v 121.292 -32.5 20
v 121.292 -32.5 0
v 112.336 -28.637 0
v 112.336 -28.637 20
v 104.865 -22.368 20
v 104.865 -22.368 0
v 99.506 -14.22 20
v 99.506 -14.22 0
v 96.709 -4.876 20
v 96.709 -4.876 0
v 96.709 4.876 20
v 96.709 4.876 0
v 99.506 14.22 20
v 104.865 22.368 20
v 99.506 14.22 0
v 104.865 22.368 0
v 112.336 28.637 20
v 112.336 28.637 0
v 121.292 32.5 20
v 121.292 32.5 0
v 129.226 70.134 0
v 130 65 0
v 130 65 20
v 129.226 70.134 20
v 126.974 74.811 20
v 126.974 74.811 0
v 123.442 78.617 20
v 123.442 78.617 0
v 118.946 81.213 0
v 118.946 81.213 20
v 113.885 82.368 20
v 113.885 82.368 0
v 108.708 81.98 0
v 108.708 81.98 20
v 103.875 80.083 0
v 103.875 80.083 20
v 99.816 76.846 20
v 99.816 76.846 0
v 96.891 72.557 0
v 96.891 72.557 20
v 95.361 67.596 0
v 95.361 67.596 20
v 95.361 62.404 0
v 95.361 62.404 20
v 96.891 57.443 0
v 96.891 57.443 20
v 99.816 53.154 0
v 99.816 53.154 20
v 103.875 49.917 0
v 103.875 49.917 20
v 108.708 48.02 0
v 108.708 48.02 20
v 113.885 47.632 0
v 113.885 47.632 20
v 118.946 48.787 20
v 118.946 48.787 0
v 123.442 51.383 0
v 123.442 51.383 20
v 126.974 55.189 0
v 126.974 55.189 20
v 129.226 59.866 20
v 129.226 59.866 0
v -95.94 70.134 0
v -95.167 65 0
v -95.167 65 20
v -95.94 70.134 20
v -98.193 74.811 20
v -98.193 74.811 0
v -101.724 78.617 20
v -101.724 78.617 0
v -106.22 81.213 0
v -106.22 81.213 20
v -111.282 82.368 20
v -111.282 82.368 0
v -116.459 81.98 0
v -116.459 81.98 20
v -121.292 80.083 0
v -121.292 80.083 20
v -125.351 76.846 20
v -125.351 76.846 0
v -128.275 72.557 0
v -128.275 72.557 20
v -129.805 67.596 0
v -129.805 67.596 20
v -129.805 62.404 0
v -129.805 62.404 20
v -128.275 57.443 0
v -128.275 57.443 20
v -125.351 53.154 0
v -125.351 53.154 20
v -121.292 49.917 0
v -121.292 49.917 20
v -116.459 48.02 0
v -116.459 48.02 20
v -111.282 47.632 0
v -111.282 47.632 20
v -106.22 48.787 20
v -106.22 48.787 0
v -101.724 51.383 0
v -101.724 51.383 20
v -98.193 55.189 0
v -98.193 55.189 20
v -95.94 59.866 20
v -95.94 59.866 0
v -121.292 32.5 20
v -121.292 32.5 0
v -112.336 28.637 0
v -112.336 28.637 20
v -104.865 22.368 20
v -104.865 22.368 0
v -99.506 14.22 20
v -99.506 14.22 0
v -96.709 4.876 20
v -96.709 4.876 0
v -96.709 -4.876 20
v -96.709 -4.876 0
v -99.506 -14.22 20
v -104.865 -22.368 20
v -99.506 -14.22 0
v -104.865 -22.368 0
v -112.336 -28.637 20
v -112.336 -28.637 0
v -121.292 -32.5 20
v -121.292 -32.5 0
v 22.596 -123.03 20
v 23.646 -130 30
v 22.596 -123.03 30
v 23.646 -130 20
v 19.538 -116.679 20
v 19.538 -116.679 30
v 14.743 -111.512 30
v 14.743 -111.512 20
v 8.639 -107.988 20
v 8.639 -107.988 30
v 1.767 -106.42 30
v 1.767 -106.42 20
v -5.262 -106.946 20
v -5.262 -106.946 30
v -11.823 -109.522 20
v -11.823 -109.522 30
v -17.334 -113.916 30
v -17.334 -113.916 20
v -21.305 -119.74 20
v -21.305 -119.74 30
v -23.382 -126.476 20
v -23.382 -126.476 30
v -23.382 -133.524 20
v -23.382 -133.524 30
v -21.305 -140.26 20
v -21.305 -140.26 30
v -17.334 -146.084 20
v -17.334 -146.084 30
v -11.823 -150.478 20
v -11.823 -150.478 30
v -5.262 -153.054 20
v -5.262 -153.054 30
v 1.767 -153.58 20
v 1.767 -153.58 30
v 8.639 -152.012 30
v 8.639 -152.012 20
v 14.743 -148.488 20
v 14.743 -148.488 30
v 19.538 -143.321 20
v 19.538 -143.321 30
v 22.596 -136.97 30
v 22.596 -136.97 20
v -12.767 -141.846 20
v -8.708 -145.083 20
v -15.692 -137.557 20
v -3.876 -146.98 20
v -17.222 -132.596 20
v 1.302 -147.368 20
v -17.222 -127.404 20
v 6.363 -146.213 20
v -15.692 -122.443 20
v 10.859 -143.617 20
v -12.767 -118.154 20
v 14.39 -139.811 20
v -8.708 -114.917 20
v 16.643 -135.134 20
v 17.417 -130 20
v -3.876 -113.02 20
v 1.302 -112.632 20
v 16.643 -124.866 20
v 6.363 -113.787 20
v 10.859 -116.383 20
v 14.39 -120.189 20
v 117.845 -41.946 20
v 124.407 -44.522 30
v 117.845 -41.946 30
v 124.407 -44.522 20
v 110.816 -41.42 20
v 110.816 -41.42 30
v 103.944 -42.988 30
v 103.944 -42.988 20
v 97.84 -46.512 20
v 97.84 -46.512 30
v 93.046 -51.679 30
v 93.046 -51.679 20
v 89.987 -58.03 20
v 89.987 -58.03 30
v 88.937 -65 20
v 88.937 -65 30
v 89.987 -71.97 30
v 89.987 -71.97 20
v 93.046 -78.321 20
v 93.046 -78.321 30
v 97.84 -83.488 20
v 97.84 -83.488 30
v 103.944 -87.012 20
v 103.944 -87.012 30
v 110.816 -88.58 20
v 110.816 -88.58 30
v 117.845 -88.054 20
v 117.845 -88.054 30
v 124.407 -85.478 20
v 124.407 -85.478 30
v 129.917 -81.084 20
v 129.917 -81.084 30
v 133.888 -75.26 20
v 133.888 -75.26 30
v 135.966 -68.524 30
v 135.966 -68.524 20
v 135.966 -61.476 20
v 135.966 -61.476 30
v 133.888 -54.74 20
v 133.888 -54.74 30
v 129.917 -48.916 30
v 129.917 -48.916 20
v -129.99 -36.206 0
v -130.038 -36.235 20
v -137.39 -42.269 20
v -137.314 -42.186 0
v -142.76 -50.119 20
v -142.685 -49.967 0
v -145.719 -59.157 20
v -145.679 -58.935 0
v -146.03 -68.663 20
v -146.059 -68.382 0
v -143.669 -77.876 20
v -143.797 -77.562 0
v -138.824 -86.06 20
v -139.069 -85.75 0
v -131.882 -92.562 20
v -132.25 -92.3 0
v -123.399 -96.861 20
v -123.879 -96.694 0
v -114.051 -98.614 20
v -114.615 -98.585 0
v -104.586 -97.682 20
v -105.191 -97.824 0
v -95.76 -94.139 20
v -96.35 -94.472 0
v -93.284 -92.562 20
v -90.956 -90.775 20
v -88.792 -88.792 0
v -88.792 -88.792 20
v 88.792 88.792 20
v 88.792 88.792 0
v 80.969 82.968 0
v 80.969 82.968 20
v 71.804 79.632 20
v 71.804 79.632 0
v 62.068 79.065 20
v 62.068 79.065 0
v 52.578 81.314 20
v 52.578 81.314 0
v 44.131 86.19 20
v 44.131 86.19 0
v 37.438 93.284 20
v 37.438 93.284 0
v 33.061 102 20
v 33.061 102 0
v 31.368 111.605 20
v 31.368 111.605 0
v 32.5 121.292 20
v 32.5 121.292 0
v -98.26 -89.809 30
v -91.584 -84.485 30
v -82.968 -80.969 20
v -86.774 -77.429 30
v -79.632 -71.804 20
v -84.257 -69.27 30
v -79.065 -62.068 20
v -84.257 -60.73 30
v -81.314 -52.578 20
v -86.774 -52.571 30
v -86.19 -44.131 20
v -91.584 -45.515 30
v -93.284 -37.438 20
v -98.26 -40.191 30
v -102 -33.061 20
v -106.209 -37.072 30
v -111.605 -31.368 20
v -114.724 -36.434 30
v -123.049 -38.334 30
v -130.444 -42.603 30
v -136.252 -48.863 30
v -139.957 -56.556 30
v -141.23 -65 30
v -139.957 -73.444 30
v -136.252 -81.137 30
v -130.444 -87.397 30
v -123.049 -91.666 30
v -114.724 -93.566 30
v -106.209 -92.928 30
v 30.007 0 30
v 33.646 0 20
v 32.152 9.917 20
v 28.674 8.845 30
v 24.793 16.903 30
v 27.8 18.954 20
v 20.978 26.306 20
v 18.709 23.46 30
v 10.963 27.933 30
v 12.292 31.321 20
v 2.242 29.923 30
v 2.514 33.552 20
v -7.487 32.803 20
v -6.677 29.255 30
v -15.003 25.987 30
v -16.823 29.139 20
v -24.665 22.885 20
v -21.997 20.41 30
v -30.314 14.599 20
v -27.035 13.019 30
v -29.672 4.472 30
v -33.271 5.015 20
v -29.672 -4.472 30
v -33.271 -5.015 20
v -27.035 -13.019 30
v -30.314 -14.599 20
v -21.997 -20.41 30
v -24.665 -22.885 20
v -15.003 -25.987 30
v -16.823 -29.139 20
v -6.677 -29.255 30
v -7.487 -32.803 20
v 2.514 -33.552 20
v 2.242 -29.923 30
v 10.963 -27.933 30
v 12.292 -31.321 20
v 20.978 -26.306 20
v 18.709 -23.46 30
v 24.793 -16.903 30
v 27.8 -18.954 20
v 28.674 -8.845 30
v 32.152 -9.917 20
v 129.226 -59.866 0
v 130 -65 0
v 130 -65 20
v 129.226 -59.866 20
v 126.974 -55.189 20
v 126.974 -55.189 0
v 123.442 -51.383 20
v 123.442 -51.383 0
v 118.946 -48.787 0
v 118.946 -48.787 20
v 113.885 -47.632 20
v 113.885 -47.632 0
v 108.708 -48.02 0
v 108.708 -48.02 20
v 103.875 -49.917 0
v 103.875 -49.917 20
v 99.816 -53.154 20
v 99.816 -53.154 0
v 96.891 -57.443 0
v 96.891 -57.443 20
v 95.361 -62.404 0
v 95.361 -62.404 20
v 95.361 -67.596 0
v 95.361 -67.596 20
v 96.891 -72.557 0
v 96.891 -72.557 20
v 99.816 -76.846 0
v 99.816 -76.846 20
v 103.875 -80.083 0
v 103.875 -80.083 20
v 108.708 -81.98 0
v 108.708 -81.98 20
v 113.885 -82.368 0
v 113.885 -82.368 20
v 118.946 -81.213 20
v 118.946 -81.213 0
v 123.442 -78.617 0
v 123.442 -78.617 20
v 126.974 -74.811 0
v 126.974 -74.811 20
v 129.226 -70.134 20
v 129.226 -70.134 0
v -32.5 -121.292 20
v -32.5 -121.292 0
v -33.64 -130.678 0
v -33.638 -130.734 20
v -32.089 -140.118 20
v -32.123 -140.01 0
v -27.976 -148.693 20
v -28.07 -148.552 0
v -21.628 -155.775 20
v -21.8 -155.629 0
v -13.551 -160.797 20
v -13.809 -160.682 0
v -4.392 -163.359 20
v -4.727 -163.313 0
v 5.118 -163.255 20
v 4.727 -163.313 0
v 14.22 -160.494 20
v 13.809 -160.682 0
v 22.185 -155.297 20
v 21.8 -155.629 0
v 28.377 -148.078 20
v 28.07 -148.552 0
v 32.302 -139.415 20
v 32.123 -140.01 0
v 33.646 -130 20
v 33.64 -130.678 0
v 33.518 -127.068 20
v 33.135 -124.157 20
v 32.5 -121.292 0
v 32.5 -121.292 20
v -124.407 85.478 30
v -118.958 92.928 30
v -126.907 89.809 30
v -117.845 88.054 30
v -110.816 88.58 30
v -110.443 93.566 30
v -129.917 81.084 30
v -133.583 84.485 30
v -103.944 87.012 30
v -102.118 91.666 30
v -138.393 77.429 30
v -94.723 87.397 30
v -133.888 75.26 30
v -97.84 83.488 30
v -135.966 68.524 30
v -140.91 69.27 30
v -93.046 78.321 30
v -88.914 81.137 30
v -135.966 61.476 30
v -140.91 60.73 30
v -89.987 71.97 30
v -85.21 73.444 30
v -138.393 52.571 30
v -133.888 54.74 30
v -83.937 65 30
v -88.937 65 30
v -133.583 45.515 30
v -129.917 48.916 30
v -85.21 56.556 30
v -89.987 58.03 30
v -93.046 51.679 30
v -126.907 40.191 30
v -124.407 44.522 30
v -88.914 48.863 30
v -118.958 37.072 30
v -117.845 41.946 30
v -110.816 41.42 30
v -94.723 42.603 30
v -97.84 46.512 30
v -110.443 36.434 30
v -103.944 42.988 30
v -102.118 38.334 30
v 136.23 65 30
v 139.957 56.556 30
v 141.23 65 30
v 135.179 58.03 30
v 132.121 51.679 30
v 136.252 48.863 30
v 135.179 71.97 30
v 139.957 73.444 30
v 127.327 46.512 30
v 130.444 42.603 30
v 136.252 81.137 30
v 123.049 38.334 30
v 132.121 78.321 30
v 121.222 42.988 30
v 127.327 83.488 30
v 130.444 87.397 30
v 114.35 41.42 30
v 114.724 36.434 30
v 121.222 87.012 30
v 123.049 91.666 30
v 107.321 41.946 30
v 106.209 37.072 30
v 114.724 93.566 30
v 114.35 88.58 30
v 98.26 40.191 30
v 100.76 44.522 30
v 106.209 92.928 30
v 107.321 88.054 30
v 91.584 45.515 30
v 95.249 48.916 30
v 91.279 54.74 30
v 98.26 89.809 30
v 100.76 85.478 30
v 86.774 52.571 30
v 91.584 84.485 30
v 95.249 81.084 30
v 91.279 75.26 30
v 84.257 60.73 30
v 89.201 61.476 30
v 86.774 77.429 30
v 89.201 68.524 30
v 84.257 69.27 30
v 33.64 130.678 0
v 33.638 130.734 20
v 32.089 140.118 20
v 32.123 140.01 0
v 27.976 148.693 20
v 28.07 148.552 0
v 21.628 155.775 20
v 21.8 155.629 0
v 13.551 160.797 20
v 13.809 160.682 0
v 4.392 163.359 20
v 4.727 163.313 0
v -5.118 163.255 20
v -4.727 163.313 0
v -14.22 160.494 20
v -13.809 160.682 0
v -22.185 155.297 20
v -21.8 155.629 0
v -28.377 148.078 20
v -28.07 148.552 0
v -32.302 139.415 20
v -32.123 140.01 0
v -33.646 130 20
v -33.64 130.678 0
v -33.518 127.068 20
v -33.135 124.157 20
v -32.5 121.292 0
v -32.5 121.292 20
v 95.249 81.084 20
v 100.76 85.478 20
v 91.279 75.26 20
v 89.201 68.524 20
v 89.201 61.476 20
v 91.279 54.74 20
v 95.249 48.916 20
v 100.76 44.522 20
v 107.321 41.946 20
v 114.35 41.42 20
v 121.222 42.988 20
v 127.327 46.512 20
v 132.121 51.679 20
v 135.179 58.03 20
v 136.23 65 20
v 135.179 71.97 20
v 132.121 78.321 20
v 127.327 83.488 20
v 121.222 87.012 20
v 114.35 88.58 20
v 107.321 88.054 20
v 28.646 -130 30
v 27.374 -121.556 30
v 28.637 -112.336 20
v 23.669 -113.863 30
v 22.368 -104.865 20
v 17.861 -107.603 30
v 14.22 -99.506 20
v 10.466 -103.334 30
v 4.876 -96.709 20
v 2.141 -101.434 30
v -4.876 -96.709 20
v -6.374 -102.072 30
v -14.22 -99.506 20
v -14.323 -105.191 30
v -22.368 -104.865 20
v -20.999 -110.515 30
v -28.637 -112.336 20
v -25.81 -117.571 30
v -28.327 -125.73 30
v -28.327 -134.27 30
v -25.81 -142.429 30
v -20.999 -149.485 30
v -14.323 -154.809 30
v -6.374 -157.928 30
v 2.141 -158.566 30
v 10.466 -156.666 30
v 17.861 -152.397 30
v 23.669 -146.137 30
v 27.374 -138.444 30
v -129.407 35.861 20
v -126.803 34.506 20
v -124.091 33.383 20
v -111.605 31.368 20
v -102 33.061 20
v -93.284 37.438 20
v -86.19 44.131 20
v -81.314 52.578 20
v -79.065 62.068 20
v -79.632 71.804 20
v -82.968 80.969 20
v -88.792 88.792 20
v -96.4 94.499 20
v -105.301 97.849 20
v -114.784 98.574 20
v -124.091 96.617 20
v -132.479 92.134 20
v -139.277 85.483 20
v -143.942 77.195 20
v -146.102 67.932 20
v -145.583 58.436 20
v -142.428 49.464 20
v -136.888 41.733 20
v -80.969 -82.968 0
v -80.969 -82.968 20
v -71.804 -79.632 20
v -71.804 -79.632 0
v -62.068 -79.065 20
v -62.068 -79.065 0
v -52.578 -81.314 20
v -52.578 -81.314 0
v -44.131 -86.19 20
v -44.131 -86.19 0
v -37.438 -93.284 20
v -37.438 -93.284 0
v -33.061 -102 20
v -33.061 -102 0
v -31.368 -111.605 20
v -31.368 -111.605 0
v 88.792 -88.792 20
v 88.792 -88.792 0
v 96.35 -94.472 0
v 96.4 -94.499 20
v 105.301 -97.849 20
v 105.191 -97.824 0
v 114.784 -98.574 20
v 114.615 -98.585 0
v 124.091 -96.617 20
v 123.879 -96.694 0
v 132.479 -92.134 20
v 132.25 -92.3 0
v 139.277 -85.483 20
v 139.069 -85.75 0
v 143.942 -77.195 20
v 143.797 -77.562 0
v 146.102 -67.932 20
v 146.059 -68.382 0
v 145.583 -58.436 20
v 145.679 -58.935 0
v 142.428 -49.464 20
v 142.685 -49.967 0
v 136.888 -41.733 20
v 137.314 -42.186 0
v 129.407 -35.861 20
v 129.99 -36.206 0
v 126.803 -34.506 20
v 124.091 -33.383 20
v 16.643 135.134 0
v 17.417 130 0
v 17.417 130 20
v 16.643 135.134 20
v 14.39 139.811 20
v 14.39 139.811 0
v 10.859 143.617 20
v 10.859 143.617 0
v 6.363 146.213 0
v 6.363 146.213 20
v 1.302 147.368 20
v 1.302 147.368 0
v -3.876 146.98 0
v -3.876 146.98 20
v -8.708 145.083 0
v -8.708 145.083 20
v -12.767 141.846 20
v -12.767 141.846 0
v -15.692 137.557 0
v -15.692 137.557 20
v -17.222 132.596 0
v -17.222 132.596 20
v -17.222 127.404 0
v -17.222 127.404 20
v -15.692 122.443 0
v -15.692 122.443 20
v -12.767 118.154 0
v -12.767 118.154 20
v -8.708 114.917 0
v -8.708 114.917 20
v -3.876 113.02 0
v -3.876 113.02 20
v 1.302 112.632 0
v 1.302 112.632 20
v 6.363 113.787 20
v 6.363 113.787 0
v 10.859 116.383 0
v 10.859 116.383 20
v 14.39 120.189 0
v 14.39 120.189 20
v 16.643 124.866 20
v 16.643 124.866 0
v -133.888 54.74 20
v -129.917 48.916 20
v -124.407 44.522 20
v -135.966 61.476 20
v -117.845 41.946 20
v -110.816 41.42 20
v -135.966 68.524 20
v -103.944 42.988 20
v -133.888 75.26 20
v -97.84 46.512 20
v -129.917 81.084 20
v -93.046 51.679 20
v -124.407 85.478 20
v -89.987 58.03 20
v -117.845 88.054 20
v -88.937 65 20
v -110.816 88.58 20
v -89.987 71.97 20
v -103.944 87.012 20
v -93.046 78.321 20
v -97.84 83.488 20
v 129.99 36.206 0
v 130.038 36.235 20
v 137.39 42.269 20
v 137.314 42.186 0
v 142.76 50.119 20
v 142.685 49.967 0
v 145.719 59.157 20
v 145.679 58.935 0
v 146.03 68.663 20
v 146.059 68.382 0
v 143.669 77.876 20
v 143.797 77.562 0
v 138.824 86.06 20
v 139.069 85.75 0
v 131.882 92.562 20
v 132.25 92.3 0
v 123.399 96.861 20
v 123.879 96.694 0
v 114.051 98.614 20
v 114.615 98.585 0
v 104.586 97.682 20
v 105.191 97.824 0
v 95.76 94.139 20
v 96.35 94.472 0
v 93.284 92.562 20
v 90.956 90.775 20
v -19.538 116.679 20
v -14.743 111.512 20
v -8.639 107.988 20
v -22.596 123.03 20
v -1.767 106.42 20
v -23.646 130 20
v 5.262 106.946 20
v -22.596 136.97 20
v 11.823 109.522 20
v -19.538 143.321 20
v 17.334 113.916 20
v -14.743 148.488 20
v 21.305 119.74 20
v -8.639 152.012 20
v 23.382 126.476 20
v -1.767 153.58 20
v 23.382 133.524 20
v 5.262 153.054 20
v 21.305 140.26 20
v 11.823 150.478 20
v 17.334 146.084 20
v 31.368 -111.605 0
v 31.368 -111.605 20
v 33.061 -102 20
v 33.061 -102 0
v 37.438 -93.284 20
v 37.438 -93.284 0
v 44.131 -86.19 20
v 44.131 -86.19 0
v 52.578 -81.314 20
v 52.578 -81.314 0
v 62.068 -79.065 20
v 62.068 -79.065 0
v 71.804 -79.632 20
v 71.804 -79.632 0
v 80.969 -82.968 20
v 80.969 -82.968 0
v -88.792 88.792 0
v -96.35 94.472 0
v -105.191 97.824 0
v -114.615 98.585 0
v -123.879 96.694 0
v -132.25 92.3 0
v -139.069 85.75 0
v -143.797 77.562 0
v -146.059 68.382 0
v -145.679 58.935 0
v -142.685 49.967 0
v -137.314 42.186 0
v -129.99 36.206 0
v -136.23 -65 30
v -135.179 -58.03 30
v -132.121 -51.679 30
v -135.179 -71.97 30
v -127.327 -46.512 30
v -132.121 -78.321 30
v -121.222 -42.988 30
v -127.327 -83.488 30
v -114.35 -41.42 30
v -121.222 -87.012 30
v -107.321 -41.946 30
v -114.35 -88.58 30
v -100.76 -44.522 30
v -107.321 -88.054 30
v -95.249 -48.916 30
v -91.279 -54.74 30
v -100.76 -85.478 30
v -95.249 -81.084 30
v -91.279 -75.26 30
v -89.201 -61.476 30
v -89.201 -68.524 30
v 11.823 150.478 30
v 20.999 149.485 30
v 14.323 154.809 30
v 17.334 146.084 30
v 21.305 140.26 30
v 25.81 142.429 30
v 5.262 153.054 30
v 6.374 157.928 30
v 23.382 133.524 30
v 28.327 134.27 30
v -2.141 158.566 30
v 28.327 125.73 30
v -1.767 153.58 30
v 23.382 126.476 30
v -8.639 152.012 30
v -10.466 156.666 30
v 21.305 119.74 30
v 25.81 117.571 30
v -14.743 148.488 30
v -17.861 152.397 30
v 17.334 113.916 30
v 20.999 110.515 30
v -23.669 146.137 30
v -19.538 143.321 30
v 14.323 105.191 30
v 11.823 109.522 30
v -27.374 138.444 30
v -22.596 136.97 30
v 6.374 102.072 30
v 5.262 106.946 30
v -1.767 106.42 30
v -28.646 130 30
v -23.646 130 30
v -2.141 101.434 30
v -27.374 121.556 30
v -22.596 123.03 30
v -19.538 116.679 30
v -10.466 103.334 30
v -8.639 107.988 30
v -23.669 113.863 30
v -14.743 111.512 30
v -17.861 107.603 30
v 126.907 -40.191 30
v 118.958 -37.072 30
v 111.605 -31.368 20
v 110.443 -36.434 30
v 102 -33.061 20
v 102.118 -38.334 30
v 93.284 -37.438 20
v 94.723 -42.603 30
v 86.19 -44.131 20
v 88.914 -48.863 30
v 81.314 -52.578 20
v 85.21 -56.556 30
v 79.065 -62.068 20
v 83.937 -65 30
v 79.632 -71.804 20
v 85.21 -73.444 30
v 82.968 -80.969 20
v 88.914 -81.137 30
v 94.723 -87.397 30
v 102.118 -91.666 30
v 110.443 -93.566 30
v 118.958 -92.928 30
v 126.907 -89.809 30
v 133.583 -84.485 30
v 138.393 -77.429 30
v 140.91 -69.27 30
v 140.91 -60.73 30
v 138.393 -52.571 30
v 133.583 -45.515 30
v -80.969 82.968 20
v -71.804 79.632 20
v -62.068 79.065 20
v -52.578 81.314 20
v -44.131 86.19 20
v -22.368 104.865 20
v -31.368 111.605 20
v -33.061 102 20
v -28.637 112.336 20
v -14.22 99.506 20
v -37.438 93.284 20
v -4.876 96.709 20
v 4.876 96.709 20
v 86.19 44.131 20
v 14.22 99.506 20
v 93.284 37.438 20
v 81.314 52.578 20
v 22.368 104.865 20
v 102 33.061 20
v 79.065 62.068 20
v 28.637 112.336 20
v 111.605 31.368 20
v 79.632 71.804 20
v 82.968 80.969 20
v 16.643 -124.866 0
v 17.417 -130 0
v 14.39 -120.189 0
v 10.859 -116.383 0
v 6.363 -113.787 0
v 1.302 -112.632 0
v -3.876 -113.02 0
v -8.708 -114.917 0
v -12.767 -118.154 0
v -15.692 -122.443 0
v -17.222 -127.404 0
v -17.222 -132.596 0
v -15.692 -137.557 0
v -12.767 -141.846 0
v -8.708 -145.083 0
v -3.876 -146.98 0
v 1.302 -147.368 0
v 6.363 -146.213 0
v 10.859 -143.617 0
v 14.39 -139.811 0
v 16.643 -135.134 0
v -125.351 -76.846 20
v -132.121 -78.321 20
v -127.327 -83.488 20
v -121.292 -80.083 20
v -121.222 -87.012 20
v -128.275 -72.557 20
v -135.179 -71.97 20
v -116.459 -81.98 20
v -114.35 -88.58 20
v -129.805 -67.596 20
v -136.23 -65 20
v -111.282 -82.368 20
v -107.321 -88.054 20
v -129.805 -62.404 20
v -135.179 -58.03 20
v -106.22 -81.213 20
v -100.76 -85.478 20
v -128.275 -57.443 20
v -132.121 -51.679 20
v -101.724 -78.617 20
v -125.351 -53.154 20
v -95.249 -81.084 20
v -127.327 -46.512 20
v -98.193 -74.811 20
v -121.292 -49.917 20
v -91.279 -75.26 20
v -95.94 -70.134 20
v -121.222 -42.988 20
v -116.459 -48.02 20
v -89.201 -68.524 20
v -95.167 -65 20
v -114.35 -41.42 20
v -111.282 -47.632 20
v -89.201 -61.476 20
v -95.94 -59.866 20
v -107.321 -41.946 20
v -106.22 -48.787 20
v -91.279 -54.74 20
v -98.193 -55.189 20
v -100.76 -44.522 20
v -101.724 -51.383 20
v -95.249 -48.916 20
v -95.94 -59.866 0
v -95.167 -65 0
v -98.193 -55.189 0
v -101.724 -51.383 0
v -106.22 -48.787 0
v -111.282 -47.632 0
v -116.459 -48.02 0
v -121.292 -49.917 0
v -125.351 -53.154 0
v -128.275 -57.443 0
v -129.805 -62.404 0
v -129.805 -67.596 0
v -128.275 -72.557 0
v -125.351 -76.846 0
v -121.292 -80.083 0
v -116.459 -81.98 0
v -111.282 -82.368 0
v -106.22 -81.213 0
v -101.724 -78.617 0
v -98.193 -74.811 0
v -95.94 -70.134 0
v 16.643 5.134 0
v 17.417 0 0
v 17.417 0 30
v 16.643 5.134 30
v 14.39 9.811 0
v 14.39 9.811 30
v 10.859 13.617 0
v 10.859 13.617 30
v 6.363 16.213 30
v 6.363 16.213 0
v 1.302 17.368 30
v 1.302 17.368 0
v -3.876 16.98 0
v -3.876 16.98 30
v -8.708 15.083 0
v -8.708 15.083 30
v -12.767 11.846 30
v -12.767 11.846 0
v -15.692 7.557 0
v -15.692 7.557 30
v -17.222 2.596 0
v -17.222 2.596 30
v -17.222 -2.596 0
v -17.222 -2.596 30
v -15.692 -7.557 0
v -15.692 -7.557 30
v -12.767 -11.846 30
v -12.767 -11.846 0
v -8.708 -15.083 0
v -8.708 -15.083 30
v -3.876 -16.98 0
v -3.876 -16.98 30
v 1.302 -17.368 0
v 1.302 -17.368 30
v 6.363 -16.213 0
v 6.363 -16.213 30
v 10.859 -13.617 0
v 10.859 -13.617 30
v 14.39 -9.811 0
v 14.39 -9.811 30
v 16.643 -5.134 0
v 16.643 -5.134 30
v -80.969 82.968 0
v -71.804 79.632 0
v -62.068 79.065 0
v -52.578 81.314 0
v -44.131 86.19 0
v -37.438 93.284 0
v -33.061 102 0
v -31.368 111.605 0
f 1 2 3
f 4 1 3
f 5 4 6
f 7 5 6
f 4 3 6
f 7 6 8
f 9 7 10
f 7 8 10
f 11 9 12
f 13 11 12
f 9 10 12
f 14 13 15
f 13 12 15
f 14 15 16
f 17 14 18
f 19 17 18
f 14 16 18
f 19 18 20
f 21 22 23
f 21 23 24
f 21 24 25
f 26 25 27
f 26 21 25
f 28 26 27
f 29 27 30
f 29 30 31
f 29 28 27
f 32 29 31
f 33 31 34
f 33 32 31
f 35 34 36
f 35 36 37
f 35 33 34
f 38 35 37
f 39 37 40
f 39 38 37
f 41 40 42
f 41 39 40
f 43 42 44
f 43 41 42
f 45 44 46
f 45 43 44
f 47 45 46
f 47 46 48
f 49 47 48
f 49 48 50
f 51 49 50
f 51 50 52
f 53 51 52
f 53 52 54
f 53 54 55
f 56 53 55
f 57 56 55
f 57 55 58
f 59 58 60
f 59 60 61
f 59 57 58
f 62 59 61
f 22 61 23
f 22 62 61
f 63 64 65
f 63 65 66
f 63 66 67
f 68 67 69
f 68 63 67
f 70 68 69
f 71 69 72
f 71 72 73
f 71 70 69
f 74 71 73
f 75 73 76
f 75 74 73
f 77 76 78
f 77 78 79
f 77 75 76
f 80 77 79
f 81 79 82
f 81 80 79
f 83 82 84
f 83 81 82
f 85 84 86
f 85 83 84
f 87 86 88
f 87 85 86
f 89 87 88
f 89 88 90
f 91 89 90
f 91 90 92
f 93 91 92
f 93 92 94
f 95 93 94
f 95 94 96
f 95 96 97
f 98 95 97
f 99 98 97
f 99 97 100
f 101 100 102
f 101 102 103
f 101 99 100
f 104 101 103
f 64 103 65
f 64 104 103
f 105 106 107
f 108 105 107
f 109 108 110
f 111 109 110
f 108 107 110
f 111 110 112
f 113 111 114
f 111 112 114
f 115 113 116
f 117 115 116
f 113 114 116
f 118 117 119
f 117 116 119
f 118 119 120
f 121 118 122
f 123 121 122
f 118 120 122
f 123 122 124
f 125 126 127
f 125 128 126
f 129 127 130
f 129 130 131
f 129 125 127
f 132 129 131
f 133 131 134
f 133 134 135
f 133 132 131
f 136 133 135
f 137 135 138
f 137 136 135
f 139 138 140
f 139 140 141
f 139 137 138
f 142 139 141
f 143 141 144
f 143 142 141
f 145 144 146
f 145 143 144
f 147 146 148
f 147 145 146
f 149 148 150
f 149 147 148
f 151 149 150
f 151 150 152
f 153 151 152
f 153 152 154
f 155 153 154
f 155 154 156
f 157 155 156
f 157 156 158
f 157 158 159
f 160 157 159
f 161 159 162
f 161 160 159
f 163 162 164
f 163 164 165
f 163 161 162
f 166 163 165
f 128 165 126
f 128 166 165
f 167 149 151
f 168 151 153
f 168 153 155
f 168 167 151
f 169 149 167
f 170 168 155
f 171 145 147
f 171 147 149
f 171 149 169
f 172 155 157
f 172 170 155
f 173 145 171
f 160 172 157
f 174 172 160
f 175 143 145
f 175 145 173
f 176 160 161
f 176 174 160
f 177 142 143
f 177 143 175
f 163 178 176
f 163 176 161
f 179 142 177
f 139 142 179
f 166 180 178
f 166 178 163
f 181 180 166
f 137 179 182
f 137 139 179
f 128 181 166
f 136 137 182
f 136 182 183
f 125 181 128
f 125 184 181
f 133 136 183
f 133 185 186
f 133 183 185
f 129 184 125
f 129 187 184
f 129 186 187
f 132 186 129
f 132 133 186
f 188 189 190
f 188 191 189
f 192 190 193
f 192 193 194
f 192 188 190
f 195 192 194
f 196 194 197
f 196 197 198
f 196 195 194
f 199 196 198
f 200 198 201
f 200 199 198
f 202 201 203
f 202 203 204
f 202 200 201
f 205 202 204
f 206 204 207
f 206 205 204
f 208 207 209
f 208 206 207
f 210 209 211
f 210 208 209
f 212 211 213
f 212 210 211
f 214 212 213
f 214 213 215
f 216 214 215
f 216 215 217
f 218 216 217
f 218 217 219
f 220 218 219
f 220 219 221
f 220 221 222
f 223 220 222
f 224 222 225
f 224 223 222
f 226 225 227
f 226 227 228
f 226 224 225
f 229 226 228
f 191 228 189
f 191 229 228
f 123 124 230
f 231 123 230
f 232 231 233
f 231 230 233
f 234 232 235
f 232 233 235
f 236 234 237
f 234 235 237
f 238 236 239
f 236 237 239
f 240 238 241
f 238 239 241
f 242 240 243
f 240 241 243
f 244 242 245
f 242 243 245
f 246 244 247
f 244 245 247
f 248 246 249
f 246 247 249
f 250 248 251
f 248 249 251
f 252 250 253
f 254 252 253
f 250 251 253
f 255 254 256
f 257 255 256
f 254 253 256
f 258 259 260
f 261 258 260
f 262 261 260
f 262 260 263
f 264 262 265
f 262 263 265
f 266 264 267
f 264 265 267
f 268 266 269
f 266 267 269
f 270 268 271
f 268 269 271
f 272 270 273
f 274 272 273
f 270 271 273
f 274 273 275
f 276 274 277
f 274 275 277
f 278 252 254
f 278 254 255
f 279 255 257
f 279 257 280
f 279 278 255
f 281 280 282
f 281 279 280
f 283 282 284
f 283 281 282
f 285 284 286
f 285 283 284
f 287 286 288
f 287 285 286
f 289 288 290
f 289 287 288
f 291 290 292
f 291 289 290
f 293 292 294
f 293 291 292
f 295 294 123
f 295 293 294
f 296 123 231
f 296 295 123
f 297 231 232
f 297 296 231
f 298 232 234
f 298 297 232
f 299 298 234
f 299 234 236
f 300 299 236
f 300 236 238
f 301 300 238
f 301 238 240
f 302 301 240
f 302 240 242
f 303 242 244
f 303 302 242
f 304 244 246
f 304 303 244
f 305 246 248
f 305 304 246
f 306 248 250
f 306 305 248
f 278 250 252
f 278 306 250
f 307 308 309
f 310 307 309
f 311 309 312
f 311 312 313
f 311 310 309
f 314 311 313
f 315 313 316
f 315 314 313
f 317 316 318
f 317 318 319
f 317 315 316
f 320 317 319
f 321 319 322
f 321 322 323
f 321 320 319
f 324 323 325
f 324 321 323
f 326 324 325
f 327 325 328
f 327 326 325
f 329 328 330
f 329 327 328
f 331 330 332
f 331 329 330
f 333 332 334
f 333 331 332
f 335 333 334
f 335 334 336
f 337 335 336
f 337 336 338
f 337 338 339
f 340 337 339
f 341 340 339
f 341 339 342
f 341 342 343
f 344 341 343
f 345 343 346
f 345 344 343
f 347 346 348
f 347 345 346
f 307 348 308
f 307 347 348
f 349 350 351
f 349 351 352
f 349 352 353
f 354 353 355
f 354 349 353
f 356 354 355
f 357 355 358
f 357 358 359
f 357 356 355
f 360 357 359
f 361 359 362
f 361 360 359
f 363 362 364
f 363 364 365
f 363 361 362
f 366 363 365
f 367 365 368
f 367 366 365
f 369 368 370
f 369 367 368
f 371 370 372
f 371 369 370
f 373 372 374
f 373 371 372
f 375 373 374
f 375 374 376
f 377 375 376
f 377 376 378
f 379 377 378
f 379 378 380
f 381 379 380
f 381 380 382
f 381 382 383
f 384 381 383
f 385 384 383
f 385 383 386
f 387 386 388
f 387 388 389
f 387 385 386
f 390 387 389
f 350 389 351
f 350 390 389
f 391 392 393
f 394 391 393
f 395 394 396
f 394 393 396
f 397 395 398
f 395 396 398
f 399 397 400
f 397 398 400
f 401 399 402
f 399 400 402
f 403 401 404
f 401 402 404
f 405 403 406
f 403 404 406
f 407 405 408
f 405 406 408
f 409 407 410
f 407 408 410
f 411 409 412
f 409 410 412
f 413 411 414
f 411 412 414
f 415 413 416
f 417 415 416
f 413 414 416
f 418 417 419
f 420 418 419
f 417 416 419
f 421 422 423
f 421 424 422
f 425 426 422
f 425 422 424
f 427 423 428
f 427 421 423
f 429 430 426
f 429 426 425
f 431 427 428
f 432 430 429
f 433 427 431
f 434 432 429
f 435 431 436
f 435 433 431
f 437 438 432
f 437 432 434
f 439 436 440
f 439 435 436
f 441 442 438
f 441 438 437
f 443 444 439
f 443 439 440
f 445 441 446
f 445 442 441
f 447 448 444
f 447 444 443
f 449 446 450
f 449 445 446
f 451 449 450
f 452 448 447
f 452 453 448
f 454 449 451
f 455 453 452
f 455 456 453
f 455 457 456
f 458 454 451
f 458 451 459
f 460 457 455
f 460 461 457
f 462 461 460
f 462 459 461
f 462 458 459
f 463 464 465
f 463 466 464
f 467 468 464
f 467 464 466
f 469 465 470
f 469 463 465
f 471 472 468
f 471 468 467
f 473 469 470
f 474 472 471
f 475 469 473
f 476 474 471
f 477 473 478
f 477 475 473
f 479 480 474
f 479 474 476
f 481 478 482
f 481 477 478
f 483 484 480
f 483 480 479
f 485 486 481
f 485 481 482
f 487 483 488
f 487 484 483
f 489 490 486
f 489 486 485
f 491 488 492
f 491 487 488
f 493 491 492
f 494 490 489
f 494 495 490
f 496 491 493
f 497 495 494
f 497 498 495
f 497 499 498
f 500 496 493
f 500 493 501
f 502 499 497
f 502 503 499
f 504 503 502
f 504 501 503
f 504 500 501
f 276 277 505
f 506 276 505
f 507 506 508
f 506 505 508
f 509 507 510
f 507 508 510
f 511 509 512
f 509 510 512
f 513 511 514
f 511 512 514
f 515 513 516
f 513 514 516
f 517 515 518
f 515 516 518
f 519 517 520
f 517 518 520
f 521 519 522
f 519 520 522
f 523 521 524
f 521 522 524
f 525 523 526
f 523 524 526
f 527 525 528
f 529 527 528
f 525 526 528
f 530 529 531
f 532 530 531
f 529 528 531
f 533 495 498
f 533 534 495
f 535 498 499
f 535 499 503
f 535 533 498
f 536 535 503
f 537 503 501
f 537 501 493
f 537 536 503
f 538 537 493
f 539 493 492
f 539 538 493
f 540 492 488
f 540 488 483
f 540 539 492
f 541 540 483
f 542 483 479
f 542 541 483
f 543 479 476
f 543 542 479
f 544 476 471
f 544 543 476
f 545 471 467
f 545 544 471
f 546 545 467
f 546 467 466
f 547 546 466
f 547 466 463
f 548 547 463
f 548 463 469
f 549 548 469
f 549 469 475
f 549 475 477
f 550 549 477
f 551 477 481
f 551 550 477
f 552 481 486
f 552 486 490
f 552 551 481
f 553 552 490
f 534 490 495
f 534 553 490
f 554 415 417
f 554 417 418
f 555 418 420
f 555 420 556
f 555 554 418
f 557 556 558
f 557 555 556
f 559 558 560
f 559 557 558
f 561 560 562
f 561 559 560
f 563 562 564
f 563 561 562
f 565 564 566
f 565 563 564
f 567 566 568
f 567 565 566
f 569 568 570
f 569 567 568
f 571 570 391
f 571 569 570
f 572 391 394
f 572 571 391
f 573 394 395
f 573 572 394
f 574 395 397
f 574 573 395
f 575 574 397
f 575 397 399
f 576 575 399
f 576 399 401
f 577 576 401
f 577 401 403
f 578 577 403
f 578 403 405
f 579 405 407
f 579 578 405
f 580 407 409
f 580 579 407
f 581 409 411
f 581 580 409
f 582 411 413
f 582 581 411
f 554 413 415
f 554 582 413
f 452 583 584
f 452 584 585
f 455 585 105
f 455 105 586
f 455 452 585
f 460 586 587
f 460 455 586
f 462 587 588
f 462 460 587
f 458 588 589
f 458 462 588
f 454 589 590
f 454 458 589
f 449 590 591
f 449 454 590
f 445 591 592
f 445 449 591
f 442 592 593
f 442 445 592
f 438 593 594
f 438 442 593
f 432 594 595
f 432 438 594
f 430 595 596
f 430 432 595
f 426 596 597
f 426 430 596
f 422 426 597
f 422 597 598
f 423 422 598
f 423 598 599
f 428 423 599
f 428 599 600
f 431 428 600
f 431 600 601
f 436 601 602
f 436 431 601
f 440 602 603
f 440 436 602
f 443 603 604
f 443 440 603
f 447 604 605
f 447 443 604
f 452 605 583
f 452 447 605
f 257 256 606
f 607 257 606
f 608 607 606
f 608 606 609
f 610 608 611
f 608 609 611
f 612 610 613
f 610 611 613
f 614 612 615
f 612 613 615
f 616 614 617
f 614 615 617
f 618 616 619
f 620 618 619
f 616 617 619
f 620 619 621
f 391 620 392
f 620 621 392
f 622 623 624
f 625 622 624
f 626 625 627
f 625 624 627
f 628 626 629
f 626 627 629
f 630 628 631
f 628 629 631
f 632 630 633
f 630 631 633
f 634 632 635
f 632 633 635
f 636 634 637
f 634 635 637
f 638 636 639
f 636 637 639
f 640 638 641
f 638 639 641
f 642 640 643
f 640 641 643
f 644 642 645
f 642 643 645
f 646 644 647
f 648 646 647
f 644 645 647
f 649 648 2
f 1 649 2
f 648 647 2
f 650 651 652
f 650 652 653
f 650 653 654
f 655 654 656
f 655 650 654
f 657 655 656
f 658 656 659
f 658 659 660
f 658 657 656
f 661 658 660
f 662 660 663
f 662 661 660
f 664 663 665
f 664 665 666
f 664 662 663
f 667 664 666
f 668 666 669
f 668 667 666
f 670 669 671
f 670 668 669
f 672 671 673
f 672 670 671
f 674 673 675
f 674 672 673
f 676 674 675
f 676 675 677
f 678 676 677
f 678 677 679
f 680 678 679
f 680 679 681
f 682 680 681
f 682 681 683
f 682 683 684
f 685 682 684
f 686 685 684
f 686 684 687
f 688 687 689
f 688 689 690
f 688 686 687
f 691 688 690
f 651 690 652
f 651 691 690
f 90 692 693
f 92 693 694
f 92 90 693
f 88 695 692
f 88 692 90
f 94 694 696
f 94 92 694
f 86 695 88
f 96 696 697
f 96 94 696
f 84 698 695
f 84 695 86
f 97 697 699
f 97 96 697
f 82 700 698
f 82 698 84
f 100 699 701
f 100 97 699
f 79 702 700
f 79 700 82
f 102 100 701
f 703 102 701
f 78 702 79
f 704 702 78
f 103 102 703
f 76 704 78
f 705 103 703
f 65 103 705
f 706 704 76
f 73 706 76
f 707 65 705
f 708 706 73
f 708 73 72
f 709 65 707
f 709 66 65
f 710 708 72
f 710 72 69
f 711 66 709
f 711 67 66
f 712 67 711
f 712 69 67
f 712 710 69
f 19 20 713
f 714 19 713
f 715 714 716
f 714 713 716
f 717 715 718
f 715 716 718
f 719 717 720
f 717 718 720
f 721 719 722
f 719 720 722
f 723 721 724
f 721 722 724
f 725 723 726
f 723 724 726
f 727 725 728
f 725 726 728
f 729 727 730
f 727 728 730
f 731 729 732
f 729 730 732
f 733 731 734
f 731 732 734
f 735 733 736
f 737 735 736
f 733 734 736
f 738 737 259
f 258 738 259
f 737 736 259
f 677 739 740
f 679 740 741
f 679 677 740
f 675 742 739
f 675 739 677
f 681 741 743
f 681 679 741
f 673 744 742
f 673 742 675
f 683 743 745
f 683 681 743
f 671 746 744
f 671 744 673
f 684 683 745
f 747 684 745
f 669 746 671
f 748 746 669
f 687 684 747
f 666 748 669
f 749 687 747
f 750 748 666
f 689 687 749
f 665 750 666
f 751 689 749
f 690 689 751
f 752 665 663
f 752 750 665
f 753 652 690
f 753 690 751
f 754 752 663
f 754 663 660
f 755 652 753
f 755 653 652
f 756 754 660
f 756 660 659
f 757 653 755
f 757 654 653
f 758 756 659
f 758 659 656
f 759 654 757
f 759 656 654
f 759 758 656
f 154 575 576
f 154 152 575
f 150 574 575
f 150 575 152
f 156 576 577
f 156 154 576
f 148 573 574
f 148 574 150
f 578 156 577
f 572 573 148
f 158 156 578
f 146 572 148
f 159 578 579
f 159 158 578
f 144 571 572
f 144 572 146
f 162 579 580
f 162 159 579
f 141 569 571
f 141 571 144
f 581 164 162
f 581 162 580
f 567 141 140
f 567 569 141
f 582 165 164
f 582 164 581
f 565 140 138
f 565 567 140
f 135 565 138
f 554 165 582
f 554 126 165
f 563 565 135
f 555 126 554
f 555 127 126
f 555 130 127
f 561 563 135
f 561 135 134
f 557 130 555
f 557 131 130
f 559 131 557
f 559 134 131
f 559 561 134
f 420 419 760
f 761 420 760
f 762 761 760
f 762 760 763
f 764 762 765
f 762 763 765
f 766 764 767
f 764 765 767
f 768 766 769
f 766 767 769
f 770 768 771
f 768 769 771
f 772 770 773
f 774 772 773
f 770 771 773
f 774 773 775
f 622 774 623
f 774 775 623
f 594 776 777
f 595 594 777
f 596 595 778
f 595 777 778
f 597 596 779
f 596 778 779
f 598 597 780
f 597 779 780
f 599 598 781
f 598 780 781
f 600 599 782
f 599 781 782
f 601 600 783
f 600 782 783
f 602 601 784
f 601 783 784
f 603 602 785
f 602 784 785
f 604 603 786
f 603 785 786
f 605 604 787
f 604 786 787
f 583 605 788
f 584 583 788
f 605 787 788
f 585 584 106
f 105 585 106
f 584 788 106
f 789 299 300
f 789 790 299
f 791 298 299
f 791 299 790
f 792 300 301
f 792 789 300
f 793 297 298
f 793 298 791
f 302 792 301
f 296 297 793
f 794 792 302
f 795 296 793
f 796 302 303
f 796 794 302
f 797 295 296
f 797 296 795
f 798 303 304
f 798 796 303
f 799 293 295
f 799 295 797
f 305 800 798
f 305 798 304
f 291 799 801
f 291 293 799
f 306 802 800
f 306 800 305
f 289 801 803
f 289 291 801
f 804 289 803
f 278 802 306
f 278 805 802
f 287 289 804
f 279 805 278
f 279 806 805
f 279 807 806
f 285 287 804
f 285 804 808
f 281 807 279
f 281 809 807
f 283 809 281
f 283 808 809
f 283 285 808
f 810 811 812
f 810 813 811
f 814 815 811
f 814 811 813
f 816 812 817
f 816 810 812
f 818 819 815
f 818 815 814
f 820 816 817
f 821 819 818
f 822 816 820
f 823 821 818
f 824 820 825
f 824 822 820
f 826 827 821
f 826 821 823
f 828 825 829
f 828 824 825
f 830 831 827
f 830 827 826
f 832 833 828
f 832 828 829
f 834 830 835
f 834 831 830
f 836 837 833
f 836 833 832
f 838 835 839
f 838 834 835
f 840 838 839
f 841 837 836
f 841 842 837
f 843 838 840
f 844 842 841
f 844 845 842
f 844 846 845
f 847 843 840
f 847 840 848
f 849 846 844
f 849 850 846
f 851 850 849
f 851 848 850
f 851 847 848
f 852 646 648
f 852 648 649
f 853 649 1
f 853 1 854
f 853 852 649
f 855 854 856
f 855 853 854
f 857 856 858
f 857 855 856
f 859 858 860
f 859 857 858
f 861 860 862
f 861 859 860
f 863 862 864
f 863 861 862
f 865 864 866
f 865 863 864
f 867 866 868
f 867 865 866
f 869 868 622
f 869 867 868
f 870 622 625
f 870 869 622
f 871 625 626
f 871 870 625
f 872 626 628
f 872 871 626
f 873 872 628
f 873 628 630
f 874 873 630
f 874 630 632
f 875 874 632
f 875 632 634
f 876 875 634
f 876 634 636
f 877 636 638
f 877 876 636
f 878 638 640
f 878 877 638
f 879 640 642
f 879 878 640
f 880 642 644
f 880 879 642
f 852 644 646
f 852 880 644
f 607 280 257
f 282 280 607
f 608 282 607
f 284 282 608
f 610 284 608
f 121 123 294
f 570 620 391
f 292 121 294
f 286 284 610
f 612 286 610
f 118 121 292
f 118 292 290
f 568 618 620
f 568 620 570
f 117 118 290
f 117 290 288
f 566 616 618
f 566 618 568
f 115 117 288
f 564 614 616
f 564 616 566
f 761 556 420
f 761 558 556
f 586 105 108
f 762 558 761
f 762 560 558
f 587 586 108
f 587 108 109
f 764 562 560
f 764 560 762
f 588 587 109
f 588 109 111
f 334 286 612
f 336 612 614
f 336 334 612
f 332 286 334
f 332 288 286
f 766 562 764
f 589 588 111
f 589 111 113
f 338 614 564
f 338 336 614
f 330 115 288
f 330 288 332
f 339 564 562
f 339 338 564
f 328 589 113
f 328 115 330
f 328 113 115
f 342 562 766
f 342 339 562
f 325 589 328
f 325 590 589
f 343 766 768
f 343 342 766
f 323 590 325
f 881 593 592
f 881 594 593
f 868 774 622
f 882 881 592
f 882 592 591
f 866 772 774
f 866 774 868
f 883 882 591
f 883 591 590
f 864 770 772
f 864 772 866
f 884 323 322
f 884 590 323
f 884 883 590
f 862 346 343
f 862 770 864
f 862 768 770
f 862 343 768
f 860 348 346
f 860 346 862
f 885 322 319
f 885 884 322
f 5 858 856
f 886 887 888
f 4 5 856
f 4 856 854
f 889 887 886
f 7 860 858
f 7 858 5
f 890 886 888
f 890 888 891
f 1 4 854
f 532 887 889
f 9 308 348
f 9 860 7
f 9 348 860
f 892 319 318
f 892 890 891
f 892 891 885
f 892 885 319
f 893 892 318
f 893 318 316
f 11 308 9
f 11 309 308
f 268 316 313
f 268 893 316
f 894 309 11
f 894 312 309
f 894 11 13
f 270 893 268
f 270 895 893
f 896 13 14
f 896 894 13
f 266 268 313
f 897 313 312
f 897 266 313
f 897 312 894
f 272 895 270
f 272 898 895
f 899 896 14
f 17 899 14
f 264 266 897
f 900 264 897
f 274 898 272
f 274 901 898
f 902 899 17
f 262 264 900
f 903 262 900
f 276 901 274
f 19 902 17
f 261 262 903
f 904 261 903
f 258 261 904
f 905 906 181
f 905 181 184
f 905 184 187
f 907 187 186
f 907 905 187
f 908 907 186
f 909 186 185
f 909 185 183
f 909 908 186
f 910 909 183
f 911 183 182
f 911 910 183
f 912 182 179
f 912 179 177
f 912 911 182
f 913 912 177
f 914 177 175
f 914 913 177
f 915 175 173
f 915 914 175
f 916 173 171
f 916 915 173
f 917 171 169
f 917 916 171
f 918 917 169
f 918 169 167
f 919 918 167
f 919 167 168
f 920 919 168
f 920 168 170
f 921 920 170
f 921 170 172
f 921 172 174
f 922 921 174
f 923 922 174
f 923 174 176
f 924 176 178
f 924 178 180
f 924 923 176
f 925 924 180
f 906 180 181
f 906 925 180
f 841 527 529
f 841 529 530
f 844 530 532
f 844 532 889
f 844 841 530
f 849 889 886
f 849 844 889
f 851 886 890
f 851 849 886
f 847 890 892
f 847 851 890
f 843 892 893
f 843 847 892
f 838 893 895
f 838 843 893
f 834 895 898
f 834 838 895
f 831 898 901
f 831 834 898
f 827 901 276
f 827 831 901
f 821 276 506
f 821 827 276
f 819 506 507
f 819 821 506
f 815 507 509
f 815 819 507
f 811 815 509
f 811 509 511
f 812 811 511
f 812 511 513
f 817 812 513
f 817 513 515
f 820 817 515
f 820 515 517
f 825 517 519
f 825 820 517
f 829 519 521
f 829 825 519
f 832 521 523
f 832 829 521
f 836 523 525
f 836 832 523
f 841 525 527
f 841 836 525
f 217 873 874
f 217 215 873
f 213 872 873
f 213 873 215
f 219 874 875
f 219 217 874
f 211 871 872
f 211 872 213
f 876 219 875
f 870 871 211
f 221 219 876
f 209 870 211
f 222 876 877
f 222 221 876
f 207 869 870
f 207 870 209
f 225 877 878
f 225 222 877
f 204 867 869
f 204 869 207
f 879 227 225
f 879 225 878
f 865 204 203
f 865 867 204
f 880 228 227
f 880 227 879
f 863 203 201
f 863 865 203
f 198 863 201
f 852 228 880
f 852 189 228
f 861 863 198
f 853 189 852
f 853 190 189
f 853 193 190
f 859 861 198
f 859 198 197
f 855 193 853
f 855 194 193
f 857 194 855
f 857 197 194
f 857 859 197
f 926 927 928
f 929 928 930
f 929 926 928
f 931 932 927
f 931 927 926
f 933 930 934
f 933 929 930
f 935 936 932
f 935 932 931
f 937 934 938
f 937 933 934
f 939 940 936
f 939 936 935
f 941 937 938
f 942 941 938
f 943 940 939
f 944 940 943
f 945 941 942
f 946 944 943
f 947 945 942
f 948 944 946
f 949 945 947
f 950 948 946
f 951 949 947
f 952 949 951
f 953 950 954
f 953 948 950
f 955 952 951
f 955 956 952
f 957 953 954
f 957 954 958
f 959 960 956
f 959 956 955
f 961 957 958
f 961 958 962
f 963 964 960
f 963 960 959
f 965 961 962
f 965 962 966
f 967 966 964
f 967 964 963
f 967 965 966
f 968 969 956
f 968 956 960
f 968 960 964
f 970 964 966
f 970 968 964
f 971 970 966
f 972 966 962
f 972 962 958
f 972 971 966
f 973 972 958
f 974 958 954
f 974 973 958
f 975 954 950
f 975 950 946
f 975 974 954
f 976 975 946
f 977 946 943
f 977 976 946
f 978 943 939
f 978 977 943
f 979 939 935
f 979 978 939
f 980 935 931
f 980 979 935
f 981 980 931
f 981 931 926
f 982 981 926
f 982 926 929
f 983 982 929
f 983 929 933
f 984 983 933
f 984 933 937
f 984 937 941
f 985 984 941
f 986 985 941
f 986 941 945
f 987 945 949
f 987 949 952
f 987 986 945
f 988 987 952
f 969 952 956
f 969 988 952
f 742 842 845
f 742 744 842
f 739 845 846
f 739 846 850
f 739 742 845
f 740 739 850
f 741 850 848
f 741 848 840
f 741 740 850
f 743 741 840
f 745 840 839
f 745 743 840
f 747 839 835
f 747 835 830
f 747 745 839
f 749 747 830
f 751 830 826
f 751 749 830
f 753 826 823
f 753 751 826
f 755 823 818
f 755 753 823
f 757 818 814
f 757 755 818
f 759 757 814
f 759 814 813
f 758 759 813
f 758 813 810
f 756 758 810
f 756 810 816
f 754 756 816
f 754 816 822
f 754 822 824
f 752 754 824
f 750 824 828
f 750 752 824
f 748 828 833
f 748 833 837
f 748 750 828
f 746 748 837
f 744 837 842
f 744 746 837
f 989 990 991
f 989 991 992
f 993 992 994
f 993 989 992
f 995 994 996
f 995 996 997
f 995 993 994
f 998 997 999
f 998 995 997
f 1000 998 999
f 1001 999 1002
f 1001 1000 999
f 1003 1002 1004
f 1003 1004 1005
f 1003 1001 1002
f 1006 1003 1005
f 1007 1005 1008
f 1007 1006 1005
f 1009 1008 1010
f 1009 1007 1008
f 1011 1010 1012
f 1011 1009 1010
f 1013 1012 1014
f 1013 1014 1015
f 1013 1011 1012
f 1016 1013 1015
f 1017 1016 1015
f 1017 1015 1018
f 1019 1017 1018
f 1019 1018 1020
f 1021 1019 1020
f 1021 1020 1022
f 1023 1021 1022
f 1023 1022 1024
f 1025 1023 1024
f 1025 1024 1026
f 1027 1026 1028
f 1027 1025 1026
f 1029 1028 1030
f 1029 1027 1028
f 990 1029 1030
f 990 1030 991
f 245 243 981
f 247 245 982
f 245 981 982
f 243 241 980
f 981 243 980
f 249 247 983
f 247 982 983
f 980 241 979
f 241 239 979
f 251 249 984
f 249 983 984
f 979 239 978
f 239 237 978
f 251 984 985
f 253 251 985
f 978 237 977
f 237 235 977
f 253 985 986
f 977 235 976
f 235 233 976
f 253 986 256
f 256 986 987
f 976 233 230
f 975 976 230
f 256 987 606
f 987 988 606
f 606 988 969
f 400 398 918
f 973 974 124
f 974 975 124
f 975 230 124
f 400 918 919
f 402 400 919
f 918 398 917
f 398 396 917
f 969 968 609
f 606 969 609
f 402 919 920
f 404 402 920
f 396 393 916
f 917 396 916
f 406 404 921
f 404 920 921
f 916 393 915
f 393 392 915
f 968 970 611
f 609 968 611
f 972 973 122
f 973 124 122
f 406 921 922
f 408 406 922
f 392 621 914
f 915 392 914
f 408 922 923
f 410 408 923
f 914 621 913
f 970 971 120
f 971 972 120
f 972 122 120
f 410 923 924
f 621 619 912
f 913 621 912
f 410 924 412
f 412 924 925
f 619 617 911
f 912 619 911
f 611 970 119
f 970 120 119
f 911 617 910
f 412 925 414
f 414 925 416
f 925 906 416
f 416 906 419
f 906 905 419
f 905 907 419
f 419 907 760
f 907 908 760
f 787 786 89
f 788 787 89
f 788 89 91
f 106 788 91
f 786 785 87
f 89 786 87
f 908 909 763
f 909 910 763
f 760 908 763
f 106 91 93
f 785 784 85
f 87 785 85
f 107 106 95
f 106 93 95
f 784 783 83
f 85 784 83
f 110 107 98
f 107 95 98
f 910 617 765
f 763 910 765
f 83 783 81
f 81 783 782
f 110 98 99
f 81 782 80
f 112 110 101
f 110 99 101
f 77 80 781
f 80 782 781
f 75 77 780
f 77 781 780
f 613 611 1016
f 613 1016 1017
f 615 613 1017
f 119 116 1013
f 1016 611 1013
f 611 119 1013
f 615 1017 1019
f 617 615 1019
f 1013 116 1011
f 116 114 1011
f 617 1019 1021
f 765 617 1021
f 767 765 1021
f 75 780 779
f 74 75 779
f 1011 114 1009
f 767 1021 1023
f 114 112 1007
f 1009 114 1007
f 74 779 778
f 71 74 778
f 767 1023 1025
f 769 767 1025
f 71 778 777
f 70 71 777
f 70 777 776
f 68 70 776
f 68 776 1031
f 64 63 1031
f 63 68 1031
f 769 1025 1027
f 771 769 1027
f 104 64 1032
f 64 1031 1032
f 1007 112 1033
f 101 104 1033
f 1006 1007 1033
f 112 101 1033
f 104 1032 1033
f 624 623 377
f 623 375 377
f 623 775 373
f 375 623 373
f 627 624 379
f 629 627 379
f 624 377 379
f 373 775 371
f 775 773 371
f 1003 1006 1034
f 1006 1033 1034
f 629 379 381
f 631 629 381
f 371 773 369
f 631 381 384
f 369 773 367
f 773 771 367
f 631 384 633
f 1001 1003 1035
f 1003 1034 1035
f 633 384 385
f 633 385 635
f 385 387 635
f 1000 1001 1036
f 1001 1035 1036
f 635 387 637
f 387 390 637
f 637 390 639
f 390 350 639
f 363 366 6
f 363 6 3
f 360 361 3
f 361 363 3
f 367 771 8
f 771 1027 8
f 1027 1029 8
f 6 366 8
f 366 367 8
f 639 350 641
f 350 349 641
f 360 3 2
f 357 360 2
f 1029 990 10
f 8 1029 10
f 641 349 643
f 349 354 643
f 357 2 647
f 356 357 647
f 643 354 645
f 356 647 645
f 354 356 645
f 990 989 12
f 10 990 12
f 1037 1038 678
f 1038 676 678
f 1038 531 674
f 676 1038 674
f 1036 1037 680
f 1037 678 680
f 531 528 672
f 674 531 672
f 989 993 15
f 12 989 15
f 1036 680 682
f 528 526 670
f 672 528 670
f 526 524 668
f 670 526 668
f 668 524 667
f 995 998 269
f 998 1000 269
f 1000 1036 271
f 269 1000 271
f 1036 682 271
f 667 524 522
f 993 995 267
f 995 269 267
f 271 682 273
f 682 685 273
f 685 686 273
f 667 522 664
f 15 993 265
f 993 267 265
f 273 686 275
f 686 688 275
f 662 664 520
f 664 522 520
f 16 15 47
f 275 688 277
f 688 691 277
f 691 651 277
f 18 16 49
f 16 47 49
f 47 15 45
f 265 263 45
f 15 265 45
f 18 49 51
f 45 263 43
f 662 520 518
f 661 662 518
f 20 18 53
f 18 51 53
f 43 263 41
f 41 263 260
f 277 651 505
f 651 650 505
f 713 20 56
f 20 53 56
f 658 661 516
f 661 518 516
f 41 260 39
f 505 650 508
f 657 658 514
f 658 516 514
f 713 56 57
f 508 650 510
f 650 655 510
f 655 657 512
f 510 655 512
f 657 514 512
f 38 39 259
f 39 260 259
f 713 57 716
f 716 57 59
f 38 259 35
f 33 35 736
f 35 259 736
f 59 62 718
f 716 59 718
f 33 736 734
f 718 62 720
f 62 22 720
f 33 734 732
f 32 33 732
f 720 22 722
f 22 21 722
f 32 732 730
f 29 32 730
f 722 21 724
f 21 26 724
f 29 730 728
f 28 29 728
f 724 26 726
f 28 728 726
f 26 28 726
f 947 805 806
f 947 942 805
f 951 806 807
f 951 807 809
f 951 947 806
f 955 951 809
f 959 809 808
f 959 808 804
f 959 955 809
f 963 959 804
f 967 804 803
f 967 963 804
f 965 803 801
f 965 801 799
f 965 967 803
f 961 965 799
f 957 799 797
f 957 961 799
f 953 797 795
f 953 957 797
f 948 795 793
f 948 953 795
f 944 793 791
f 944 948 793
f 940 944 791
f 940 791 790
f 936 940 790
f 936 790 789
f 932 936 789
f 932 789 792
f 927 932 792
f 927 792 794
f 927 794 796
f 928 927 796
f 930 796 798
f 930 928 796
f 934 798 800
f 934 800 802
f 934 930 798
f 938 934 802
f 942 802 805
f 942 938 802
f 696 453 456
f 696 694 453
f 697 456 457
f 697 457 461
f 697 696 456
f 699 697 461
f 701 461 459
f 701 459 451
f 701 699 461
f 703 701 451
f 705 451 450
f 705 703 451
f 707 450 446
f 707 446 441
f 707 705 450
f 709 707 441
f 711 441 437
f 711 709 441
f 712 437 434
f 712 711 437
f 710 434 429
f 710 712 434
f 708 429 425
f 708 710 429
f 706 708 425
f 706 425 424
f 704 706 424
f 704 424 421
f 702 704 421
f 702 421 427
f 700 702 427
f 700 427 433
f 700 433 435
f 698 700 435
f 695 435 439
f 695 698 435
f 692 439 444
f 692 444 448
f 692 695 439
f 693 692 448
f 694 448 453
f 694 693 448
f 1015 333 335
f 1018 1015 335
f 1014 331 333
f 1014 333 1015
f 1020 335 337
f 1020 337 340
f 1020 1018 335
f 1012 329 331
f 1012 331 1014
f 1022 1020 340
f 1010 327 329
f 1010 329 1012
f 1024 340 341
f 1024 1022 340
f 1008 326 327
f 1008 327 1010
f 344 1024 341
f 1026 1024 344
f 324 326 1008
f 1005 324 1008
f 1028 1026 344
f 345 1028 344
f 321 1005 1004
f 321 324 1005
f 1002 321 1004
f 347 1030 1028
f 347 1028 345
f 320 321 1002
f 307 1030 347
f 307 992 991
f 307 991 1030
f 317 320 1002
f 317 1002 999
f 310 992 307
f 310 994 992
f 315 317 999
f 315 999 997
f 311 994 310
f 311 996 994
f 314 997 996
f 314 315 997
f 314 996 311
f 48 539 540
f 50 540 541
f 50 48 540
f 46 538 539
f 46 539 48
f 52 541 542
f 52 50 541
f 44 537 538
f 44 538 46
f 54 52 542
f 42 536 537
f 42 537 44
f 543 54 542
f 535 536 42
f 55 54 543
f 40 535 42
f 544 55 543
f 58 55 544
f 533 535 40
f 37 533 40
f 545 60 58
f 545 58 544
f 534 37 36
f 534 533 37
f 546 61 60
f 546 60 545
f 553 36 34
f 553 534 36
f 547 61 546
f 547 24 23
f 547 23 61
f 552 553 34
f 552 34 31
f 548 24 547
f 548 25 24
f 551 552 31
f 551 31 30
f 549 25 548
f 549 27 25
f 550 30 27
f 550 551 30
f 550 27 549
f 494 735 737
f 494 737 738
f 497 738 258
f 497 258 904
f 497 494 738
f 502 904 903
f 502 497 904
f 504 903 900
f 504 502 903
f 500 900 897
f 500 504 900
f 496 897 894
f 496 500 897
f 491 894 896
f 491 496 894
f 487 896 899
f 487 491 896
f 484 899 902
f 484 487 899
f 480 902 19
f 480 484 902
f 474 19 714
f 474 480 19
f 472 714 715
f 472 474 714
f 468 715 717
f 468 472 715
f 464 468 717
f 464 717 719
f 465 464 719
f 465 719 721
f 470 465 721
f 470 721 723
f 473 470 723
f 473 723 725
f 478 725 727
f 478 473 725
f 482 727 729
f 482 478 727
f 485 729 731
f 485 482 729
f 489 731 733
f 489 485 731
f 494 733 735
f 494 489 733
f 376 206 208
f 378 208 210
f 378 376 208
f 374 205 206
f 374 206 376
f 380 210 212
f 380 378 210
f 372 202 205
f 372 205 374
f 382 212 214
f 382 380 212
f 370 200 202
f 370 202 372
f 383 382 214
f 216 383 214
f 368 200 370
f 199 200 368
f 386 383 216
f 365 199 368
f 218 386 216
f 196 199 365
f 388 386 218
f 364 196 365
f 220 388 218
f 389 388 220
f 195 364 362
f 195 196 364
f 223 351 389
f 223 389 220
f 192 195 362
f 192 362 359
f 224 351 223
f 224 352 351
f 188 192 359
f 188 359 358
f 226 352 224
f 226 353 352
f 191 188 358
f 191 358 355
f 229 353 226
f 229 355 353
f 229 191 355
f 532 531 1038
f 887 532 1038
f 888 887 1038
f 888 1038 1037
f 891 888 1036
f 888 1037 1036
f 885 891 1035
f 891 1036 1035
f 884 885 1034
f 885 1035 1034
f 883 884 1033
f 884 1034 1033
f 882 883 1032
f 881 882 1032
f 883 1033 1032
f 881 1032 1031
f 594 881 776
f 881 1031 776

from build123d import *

# Parameters (mm, degrees)
SKETCH2_R           = 17.416697508
BOSS_EXTRUDE1_DEPTH = 20
SKETCH7_R           = 17.416697508
CUT_EXTRUDE2_DEPTH  = 20
CIRPATTERN1_COUNT   = 6
SKETCH8_R           = 33.646475863
BOSS_EXTRUDE2_DEPTH = 30
SKETCH10_R          = 17.416697508
CUT_EXTRUDE3_DEPTH  = 30
CHAMFER1_SIZE2      = 3.639702343
CHAMFER1_SIZE       = 10


with BuildPart() as part:
    # Sketch2 → Boss-Extrude1 (new body)
    with BuildSketch(Plane.XY):
        with BuildLine():
            ThreePointArc((32.5, 121.291651246), (0, 163.646475863), (-32.5, 121.291651246))
            ThreePointArc((-32.5, 121.291651246), (-48.176762068, 83.444599647), (-88.791651246, 88.791651246))
            ThreePointArc((-88.791651246, 88.791651246), (-141.722005337, 81.823237932), (-121.291651246, 32.5))
            ThreePointArc((-121.291651246, 32.5), (-96.353524137, 0), (-121.291651246, -32.5))
            ThreePointArc((-121.291651246, -32.5), (-141.722005337, -81.823237932), (-88.791651246, -88.791651246))
            ThreePointArc((-88.791651246, -88.791651246), (-48.176762068, -83.444599647), (-32.5, -121.291651246))
            ThreePointArc((-32.5, -121.291651246), (0, -163.646475863), (32.5, -121.291651246))
            ThreePointArc((32.5, -121.291651246), (48.176762068, -83.444599647), (88.791651246, -88.791651246))
            ThreePointArc((88.791651246, -88.791651246), (141.722005337, -81.823237932), (121.291651246, -32.5))
            ThreePointArc((121.291651246, -32.5), (96.353524137, 0), (121.291651246, 32.5))
            ThreePointArc((121.291651246, 32.5), (141.722005337, 81.823237932), (88.791651246, 88.791651246))
            ThreePointArc((88.791651246, 88.791651246), (48.176762068, 83.444599647), (32.5, 121.291651246))
        make_face()
        with Locations((0, 130)):
            Circle(SKETCH2_R, mode=Mode.SUBTRACT)
        with Locations((112.583302492, 65)):
            Circle(SKETCH2_R, mode=Mode.SUBTRACT)
        with Locations((112.583302492, -65)):
            Circle(SKETCH2_R, mode=Mode.SUBTRACT)
        with Locations((0, -130)):
            Circle(SKETCH2_R, mode=Mode.SUBTRACT)
        with Locations((-112.583302492, -65)):
            Circle(SKETCH2_R, mode=Mode.SUBTRACT)
        with Locations((-112.583302492, 65)):
            Circle(SKETCH2_R, mode=Mode.SUBTRACT)
    extrude(amount=BOSS_EXTRUDE1_DEPTH)

    # Sketch4 → Revolve1 (revolve)
    with BuildSketch(Plane(origin=(0, 0, 0), x_dir=(0, 0, -1), z_dir=(1, 0, 0)), mode=Mode.PRIVATE) as revolve1_sk:
        Polygon((-20, 163.646475863), (-30, 158.646475863), (-30, 153.646475863), (-20, 153.646475863), align=None)
    revolve1 = revolve(revolve1_sk.sketch.rotate(Axis((0, 130, 0), (0, 0, 1)), 90), axis=Axis((0, 130, 0), (0, 0, 1)))

    # Sketch7 → Cut-Extrude2 (cut)
    with BuildSketch(Plane.XY):
        Circle(SKETCH7_R)
    extrude(amount=CUT_EXTRUDE2_DEPTH, mode=Mode.SUBTRACT)

    # CirPattern1: Revolve1 ×6 about axis
    cirpattern1_axis = Axis((0, 0, 0), (0, 0, 1))
    for i in range(1, CIRPATTERN1_COUNT):
        add(revolve1.rotate(cirpattern1_axis, i * 360 / CIRPATTERN1_COUNT))

    # Sketch8 → Boss-Extrude2 (add)
    with BuildSketch(Plane.XY):
        Circle(SKETCH8_R)
    extrude(amount=BOSS_EXTRUDE2_DEPTH)

    # Sketch10 → Cut-Extrude3 (cut)
    with BuildSketch(Plane.XY):
        Circle(SKETCH10_R)
    extrude(amount=CUT_EXTRUDE3_DEPTH, mode=Mode.SUBTRACT)

    # Chamfer1
    chamfer1_edges = [part.edges().sort_by_distance(p)[0] for p in [
        (-33.646475863, 0, 30),
    ]]
    chamfer1_side = [part.faces().sort_by_distance(p)[0] for p in [
        (-33.646475863, 0, 29.927205953),
    ]]
    chamfer(chamfer1_edges, length=CHAMFER1_SIZE - 0.0001, length2=CHAMFER1_SIZE2 - 0.0001, reference=chamfer1_side[0])  # a hair under: the kernel refuses the full size


solid = part.part
